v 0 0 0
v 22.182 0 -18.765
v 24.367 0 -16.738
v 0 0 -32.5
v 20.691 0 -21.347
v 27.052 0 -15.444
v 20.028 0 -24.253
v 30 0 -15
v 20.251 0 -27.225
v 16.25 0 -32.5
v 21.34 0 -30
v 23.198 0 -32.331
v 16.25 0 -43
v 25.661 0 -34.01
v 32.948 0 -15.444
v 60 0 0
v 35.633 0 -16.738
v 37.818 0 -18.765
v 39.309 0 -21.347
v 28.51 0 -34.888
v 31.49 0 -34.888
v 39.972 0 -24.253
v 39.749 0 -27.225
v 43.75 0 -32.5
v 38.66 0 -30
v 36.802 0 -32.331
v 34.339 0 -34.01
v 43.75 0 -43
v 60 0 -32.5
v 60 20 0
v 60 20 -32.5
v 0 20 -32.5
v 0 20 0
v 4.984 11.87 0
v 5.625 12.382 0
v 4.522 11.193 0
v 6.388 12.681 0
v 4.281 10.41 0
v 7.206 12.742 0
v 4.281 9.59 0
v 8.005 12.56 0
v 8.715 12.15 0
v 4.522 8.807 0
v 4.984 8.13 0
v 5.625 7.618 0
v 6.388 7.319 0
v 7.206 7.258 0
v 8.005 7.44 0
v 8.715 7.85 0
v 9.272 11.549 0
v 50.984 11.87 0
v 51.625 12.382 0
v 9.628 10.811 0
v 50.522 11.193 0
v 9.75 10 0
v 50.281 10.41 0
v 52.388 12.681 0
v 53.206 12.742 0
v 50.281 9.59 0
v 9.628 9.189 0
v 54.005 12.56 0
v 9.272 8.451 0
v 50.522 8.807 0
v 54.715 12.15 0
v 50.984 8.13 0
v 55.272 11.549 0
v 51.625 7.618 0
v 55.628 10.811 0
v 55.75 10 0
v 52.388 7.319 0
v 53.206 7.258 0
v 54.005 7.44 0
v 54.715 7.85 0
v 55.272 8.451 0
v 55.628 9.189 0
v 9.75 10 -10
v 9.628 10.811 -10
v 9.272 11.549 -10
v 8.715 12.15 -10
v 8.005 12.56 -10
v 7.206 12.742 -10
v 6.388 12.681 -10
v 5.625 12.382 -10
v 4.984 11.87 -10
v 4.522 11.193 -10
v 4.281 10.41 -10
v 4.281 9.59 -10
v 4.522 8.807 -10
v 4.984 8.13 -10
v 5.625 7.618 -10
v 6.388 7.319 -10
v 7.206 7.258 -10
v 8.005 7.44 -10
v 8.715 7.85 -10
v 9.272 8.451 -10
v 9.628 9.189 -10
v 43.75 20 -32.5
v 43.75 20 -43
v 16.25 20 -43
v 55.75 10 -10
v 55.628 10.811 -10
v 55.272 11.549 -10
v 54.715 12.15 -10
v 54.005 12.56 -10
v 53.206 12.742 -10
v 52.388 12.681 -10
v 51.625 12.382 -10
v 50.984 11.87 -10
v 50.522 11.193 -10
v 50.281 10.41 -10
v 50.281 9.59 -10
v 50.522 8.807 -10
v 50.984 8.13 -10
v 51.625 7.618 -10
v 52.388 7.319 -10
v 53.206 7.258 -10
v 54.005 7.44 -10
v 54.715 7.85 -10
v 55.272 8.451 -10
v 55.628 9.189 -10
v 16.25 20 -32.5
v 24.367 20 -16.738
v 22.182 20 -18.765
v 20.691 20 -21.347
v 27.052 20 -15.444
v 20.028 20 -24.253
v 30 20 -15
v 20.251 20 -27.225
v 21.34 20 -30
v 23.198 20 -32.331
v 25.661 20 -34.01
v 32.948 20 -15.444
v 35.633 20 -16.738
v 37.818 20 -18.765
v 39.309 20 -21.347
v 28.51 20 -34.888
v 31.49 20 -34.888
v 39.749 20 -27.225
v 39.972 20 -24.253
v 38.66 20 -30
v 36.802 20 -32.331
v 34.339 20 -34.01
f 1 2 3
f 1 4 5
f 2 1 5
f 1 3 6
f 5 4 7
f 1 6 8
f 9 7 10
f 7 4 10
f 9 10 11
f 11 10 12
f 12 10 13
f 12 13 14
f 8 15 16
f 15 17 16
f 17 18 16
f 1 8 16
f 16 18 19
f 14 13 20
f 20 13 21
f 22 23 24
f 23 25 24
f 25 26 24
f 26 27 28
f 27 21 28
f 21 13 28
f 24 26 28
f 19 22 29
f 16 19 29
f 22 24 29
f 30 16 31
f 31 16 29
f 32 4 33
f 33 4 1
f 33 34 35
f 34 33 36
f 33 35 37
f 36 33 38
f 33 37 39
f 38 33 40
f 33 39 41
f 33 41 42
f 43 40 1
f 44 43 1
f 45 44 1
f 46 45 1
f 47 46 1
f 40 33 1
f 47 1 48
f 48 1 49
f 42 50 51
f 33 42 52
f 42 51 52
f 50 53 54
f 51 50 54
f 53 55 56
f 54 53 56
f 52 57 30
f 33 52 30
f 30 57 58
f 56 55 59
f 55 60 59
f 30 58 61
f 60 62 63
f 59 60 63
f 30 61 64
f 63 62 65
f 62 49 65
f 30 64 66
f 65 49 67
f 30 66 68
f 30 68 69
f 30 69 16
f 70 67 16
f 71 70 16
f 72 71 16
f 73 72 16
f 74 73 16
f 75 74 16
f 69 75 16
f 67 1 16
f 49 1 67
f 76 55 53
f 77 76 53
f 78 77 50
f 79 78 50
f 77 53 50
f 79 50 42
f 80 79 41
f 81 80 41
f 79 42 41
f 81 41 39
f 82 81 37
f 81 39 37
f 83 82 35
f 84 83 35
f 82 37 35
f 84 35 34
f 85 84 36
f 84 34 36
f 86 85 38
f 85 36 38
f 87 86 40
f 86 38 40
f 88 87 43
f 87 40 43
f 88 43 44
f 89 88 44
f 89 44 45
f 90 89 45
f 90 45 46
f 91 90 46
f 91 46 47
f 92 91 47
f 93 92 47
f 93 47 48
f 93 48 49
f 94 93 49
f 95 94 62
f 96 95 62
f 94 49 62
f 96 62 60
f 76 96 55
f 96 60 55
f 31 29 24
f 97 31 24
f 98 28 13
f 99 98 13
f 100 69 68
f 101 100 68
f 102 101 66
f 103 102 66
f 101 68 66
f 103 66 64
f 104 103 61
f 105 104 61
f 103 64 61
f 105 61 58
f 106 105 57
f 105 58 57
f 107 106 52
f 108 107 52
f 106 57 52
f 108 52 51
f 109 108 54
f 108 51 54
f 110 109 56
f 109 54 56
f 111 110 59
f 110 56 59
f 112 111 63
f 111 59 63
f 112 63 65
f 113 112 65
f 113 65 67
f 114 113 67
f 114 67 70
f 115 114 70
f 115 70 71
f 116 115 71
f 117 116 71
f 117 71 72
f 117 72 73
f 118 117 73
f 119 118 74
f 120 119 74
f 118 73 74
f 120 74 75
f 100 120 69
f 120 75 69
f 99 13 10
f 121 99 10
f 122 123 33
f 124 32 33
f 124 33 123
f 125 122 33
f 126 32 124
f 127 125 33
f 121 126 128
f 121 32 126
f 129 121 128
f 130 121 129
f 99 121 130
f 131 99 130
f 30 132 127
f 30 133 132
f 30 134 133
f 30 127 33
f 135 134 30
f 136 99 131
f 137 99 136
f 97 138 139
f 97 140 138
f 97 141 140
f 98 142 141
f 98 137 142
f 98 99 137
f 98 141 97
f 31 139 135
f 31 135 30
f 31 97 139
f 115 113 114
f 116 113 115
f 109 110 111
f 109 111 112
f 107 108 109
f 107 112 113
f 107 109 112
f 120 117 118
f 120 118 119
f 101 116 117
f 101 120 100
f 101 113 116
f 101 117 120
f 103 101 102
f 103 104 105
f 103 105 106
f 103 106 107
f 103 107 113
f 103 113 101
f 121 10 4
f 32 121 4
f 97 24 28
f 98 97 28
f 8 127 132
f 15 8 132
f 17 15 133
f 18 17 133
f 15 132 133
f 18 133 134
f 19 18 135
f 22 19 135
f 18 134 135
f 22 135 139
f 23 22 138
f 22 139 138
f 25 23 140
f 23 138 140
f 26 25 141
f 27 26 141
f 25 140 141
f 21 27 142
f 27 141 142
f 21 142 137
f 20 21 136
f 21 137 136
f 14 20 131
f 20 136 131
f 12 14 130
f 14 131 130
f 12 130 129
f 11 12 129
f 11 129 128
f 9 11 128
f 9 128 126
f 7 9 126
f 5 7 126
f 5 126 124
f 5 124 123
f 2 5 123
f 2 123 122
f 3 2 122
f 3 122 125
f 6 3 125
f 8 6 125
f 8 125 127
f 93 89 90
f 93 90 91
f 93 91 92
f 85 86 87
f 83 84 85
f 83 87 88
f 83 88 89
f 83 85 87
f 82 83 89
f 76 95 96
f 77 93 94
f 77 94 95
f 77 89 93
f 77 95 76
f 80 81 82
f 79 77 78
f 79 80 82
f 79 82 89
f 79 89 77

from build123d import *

# Parameters (mm, degrees)
BOSS_EXTRUDE1_DEPTH = 20
SKETCH2_R           = 10
CUT_EXTRUDE1_DEPTH  = 77.47875522
SKETCH6_R           = 2.75
CUT_EXTRUDE2_DEPTH  = 10


with BuildPart() as part:
    # Sketch1 → Boss-Extrude1 (new body)
    with BuildSketch(Plane(origin=(0, 0, 0), x_dir=(1, 0, 0), z_dir=(0, 1, 0))):
        Polygon((0, 32.5), (0, 0), (60, 0), (60, 32.5), (43.75, 32.5), (43.75, 43), (16.25, 43), (16.25, 32.5), align=None)
    extrude(amount=BOSS_EXTRUDE1_DEPTH)

    # Sketch2 → Cut-Extrude1 (cut, through all)
    with BuildSketch(Plane(origin=(0, 20, 0), x_dir=(1, 0, 0), z_dir=(0, 1, 0))):
        with Locations(Location((30, 25, 0), (0, 0, 270))):
            Circle(SKETCH2_R)
    extrude(amount=-CUT_EXTRUDE1_DEPTH, mode=Mode.SUBTRACT)

    # Sketch6 → Cut-Extrude2 (cut)
    with BuildSketch(Plane.XY):
        with Locations((7, 10)):
            Circle(SKETCH6_R)
        with Locations((53, 10)):
            Circle(SKETCH6_R)
    extrude(amount=-CUT_EXTRUDE2_DEPTH, mode=Mode.SUBTRACT)


solid = part.part
